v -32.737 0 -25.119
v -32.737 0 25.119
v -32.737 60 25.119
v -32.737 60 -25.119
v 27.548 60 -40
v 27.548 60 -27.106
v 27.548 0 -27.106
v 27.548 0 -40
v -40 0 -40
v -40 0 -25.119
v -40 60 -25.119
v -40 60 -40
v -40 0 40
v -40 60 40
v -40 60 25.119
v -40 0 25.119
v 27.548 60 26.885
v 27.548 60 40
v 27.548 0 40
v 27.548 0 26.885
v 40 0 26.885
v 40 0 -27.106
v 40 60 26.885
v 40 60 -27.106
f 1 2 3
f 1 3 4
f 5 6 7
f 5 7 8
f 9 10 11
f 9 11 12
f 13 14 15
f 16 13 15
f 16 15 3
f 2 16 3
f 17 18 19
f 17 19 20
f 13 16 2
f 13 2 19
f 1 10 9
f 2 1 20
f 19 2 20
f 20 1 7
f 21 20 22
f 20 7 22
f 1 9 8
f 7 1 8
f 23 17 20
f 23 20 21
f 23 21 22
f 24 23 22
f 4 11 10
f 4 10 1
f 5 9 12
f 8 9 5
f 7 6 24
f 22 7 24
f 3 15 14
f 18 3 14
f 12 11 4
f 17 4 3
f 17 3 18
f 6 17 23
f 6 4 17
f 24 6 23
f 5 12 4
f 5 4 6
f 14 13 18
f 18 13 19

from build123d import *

# Parameters (mm, degrees)
SKETCH1_W           = 80
SKETCH1_H           = 80
BOSS_EXTRUDE1_DEPTH = 60
SKETCH2_W           = 7.262949675
SKETCH2_H           = 50.237294764
CUT_EXTRUDE1_DEPTH  = 83.462112512
SKETCH3_W           = 12.452296607
SKETCH3_H           = 12.893943155
SKETCH3_H_2         = 13.114766428
CUT_EXTRUDE2_DEPTH  = 83.462112512


with BuildPart() as part:
    # Sketch1 → Boss-Extrude1 (new body)
    with BuildSketch(Plane(origin=(0, 0, 0), x_dir=(1, 0, 0), z_dir=(0, 1, 0))):
        Rectangle(SKETCH1_W, SKETCH1_H)
    extrude(amount=BOSS_EXTRUDE1_DEPTH)

    # Sketch2 → Cut-Extrude1 (cut, through all)
    with BuildSketch(Plane(origin=(0, 60, 0), x_dir=(1, 0, 0), z_dir=(0, 1, 0))):
        with Locations((-36.368525163, 0)):
            Rectangle(SKETCH2_W, SKETCH2_H)
    extrude(amount=-CUT_EXTRUDE1_DEPTH, mode=Mode.SUBTRACT)

    # Sketch3 → Cut-Extrude2 (cut, through all)
    with BuildSketch(Plane(origin=(0, 60, 0), x_dir=(1, 0, 0), z_dir=(0, 1, 0))):
        with Locations((33.773851697, 33.553028422)):
            Rectangle(SKETCH3_W, SKETCH3_H)
        with Locations((33.773851697, -33.442616786)):
            Rectangle(SKETCH3_W, SKETCH3_H_2)
    extrude(amount=-CUT_EXTRUDE2_DEPTH, mode=Mode.SUBTRACT)


solid = part.part
